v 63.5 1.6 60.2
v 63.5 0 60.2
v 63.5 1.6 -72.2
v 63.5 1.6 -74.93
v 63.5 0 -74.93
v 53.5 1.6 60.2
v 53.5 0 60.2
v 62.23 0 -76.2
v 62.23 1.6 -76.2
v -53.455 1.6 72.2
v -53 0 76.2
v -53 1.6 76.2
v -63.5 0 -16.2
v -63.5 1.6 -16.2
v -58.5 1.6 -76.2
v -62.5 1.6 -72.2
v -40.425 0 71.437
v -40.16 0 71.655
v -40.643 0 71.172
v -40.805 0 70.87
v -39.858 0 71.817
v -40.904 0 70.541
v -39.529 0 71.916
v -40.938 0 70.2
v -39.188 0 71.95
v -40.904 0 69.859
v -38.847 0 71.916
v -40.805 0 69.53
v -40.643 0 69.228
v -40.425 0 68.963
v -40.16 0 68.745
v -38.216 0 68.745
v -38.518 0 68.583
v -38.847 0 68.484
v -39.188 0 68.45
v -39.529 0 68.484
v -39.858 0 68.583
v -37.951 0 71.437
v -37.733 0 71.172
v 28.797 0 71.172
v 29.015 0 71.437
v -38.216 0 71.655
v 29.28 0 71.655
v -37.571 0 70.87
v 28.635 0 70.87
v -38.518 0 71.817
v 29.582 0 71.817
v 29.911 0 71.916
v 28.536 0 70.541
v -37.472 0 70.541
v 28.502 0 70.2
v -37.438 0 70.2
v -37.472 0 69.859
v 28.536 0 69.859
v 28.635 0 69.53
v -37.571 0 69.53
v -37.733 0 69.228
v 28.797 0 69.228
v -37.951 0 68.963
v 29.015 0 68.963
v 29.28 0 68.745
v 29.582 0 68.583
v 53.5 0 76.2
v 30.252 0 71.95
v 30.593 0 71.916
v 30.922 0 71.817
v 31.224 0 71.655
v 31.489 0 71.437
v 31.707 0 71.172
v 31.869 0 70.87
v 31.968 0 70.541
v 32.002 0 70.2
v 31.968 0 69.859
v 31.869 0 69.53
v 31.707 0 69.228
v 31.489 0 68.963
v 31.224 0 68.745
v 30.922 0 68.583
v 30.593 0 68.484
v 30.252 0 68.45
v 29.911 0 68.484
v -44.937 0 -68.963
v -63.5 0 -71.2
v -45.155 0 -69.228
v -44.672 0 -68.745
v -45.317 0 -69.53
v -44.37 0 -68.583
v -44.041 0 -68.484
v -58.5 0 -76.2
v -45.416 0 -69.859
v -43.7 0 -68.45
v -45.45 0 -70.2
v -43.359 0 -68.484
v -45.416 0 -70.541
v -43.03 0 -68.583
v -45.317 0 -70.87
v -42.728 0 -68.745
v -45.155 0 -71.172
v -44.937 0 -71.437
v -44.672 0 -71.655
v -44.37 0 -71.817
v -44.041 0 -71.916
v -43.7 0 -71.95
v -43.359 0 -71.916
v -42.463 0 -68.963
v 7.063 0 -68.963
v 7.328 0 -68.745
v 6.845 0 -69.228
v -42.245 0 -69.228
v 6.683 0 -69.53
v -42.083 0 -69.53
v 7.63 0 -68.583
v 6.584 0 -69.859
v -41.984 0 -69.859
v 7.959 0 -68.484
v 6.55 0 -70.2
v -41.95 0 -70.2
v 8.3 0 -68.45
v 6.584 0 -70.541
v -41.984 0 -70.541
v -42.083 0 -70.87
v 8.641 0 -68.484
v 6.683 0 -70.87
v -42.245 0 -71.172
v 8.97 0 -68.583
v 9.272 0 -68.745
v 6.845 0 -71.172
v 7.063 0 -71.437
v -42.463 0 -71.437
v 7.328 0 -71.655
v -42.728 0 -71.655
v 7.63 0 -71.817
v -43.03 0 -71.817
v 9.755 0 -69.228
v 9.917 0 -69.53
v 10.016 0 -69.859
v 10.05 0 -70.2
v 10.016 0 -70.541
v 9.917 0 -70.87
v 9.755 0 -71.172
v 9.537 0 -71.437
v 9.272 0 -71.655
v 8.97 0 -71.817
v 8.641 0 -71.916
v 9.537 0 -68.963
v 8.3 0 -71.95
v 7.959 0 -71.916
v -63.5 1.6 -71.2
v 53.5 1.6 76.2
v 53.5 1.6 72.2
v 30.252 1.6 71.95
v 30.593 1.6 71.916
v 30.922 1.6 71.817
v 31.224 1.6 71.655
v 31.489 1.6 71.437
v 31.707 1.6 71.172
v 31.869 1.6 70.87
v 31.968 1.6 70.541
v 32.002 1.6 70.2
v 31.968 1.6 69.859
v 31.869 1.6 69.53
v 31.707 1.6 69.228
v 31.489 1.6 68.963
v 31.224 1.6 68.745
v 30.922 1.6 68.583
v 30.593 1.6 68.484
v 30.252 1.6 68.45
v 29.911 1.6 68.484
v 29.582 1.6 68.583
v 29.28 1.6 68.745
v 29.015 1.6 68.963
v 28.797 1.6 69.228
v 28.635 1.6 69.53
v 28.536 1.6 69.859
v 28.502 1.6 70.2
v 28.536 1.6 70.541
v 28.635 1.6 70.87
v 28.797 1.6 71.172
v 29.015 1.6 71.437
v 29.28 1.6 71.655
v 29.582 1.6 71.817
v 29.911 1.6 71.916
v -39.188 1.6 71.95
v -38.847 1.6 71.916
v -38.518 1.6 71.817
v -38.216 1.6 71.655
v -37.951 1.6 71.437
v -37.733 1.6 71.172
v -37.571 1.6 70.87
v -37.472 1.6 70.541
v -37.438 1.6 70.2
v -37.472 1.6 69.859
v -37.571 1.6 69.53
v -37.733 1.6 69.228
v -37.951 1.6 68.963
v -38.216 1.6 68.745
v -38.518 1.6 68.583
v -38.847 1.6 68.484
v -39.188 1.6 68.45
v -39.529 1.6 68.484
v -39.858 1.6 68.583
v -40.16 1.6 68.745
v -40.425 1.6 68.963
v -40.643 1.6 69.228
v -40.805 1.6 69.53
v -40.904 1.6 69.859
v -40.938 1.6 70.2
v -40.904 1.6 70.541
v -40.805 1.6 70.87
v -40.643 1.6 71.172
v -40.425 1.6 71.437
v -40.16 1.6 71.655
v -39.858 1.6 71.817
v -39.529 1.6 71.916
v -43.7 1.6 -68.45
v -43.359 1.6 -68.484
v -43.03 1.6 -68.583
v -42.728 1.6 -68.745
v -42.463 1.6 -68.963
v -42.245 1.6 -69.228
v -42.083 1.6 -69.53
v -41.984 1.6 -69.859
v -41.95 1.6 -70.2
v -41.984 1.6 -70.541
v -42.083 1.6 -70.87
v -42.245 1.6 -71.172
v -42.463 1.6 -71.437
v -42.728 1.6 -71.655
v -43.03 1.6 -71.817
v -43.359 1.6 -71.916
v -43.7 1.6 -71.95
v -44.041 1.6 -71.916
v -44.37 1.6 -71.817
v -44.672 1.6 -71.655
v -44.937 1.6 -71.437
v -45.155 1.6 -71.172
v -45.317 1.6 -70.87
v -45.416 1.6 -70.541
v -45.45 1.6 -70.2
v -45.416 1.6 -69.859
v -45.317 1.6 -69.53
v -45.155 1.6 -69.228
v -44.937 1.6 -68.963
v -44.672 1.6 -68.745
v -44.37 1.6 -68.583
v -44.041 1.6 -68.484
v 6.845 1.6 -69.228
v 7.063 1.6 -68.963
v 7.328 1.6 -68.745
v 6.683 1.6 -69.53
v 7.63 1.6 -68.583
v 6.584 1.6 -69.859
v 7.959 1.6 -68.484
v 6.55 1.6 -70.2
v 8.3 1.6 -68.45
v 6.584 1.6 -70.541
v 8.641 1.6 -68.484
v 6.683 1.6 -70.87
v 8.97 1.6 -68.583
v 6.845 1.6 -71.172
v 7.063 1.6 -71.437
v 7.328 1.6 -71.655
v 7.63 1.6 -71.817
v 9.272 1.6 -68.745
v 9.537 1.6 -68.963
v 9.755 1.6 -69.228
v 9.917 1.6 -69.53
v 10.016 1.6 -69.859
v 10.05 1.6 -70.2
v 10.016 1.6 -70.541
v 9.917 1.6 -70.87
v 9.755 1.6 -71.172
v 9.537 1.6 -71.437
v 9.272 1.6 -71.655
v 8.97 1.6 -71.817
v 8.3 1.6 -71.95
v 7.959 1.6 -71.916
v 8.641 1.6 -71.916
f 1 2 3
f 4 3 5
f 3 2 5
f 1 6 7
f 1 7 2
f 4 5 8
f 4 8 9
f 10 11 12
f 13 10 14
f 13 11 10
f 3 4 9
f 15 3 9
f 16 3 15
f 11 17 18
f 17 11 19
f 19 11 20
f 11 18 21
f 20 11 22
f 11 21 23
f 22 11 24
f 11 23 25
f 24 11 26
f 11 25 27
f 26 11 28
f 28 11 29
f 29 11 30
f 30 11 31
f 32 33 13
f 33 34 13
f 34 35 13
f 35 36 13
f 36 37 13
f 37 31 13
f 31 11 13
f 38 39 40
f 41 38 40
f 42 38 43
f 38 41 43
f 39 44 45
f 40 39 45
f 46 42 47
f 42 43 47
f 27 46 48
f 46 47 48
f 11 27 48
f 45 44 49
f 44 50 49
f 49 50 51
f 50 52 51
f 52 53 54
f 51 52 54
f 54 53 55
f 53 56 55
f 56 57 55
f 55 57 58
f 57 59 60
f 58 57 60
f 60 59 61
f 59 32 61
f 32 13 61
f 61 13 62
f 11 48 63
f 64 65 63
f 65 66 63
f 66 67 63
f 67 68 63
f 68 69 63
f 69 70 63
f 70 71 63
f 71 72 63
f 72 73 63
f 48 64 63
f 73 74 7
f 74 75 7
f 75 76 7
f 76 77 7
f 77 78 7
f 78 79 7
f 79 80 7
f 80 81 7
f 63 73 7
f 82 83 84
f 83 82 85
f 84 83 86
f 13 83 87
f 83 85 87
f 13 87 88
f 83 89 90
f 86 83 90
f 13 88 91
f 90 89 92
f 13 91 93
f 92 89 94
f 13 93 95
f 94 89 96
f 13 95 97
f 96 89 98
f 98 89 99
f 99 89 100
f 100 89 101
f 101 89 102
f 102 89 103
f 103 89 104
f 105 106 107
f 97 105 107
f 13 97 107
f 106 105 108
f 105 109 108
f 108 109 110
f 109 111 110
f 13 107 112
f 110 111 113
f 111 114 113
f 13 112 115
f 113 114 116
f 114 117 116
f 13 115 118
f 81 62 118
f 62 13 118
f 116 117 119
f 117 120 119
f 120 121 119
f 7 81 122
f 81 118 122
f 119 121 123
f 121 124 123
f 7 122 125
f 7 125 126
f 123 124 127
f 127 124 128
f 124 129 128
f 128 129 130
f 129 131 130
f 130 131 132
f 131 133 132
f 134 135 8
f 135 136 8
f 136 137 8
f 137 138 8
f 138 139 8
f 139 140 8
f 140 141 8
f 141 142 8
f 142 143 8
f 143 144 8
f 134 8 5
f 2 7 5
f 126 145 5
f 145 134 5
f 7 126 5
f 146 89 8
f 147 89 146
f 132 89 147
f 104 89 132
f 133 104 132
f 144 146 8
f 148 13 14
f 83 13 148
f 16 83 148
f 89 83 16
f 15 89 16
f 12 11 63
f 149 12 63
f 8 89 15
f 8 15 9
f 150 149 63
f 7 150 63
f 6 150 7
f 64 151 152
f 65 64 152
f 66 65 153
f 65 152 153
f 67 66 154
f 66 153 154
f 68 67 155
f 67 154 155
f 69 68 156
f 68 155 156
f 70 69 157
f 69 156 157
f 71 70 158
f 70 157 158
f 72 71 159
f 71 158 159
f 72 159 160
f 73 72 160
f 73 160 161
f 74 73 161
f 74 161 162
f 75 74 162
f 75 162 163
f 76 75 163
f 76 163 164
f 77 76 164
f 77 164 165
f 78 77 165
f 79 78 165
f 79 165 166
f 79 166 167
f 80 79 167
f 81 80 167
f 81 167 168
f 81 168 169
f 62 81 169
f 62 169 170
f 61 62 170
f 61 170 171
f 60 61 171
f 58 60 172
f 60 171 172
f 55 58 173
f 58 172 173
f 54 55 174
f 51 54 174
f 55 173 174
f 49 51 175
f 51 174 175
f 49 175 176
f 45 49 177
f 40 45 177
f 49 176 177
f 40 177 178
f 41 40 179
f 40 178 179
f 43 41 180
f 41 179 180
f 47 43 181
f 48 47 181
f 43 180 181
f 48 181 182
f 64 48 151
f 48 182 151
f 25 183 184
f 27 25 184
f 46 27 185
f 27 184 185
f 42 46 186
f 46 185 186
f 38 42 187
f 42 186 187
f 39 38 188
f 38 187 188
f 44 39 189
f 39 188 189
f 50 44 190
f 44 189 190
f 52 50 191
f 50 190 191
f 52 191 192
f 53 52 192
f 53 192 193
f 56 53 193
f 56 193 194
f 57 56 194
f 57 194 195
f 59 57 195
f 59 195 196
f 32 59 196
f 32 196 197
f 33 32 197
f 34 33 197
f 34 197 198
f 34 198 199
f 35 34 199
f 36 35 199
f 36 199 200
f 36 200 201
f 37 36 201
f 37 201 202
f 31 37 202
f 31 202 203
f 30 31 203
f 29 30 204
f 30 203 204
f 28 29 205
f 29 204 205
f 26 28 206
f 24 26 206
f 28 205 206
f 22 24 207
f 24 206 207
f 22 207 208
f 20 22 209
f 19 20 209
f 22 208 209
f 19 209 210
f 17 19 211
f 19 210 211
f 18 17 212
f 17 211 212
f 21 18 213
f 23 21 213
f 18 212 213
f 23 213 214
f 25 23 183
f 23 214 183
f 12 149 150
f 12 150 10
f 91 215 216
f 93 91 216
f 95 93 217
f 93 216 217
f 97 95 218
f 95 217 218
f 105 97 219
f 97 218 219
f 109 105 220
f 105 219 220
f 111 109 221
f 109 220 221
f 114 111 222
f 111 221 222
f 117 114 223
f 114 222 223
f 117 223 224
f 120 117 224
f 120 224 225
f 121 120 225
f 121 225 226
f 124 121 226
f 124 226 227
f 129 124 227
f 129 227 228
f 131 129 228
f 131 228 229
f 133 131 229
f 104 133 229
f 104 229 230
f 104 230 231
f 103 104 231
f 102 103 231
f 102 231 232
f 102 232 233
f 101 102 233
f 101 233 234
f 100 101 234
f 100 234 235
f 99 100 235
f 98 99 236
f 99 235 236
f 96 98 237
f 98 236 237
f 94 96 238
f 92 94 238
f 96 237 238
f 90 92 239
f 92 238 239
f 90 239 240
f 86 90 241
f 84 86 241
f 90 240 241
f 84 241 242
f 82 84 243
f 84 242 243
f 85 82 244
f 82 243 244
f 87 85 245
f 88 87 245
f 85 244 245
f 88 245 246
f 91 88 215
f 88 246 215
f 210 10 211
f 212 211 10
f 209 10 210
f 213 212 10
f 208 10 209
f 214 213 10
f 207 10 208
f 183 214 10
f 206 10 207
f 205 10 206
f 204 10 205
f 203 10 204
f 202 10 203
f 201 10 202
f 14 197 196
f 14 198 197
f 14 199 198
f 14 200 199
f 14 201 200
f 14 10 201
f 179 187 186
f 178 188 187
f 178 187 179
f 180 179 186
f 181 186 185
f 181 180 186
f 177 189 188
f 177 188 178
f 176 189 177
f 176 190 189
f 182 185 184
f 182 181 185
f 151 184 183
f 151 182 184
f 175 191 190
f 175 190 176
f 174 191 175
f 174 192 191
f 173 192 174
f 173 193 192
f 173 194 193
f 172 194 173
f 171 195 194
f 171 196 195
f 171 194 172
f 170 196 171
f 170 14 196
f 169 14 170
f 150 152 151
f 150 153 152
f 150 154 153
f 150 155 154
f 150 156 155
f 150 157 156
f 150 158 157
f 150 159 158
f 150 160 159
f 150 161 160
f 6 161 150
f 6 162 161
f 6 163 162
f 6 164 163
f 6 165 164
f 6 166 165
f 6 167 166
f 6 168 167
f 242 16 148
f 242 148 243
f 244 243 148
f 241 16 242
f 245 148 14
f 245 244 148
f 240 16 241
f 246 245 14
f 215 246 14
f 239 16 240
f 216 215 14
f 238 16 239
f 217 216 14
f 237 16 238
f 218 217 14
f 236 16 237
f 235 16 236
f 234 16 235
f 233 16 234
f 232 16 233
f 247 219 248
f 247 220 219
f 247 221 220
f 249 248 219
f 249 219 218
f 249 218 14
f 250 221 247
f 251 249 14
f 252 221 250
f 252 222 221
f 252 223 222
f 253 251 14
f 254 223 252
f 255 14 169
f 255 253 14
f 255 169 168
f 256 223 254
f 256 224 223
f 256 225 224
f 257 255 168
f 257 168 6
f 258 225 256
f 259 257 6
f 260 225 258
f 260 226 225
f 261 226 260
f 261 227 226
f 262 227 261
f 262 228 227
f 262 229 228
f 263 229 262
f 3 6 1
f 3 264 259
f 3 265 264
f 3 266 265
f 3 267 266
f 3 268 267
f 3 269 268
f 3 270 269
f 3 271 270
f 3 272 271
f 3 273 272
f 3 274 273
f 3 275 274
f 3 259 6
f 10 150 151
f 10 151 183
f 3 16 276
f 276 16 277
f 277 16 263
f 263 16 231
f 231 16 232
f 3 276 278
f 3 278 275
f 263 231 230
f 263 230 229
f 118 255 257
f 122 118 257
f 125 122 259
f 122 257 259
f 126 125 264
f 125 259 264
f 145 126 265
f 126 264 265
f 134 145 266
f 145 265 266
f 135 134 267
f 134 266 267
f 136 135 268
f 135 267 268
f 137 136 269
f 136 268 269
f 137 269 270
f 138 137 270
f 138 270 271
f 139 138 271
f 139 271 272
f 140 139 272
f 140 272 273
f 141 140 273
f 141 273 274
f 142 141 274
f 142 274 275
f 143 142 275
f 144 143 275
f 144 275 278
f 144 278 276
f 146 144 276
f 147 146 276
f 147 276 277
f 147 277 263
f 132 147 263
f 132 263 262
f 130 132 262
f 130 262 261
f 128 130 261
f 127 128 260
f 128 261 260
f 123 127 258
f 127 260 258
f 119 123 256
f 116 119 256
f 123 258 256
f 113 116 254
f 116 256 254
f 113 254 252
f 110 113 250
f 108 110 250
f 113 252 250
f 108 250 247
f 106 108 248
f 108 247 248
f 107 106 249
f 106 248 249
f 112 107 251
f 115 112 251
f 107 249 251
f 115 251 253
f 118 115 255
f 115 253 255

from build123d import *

# Parameters (mm, degrees)
SKETCH1_W               = 127
SKETCH1_H               = 152.4
BOSS_EXTRUDE1_DEPTH     = 1.6
CHAMFER1_SIZE           = 5
CHAMFER2_SIZE           = 1.27
SKETCH4_OUTSIDE_W       = 168.678
SKETCH4_OUTSIDE_H       = 194.078
SKETCH4_OUTSIDE_W_2     = 146.645454771
SKETCH4_OUTSIDE_H_2     = 144.4
CUT_EXTRUDE3_DEPTH      = 0.0001
CUT_EXTRUDE4_DEPTH      = 100.203074549
CUT_EXTRUDE4_DEPTH_BACK = 100.203074549
SKETCH7_W               = 10
SKETCH7_H               = 16
CUT_EXTRUDE7_DEPTH      = 10
CUT_EXTRUDE8_REACH      = 101.203
SKETCH9_R               = 1.75


with BuildPart() as part:
    # Sketch1 → Boss-Extrude1 (new body)
    with BuildSketch(Plane(origin=(0, 0, 0), x_dir=(1, 0, 0), z_dir=(0, 1, 0))):
        Rectangle(SKETCH1_W, SKETCH1_H)
    extrude(amount=BOSS_EXTRUDE1_DEPTH)

    # Chamfer1
    chamfer1_edges = [part.edges().sort_by_distance(p)[0] for p in [
        (-63.5, 0.8, 76.2),
        (-63.5, 0.8, -76.2),
    ]]
    chamfer(chamfer1_edges, length=CHAMFER1_SIZE)

    # Chamfer2
    chamfer2_edges = [part.edges().sort_by_distance(p)[0] for p in [
        (63.5, 0.8, 76.2),
        (63.5, 0.8, -76.2),
    ]]
    chamfer(chamfer2_edges, length=CHAMFER2_SIZE)

    # Sketch4 outside → Cut-Extrude3 (cut)
    with BuildSketch(Plane(origin=(0, 1.6, 0), x_dir=(-1, 0, 0), z_dir=(0, 1, 0))):
        Rectangle(SKETCH4_OUTSIDE_W, SKETCH4_OUTSIDE_H)
        with Locations((0.842207065, 0)):
            Rectangle(SKETCH4_OUTSIDE_W_2, SKETCH4_OUTSIDE_H_2, mode=Mode.SUBTRACT)
    extrude(amount=-CUT_EXTRUDE3_DEPTH, mode=Mode.SUBTRACT)

    # Sketch5 → Cut-Extrude4 (cut, two sides: drawn at the far end of the back side and taken through both)
    with BuildSketch(Plane(origin=(0, 1.6, 0), x_dir=(1, 0, 0), z_dir=(0, 1, 0)).offset(-CUT_EXTRUDE4_DEPTH_BACK)):
        Polygon((-8.552407118, -467.338817365), (-53, -76.2), (-63.5, 16.2), (-107.947592882, 407.338817365), (-890.225227612, 318.4436316), (-790.830041847, -556.23400313), align=None)
    extrude(amount=CUT_EXTRUDE4_DEPTH + CUT_EXTRUDE4_DEPTH_BACK, mode=Mode.SUBTRACT)

    # Sketch7 → Cut-Extrude7 (cut)
    with BuildSketch(Plane(origin=(0, 1.6, 0), x_dir=(1, 0, 0), z_dir=(0, 1, 0))):
        with Locations((58.5, -68.2)):
            Rectangle(SKETCH7_W, SKETCH7_H)
    extrude(amount=-CUT_EXTRUDE7_DEPTH, mode=Mode.SUBTRACT)

    # Sketch9 → Cut-Extrude8 (cut, up to next)
    with BuildSketch(Plane(origin=(0, 1.6, 0), x_dir=(1, 0, 0), z_dir=(0, 1, 0)), mode=Mode.PRIVATE) as cut_extrude8_sk1:
        with Locations(Location((-43.7, 70.2, 0), (0, 0, 270))):
            Circle(SKETCH9_R)
    cut_extrude8_tool1 = extrude(cut_extrude8_sk1.sketch, amount=-CUT_EXTRUDE8_REACH, mode=Mode.PRIVATE) & part.part
    # Sketch9 → Cut-Extrude8 (cut, up to next)
    with BuildSketch(Plane(origin=(0, 1.6, 0), x_dir=(1, 0, 0), z_dir=(0, 1, 0)), mode=Mode.PRIVATE) as cut_extrude8_sk2:
        with Locations(Location((8.3, 70.2, 0), (0, 0, 270))):
            Circle(SKETCH9_R)
    cut_extrude8_tool2 = extrude(cut_extrude8_sk2.sketch, amount=-CUT_EXTRUDE8_REACH, mode=Mode.PRIVATE) & part.part
    # Sketch9 → Cut-Extrude8 (cut, up to next)
    with BuildSketch(Plane(origin=(0, 1.6, 0), x_dir=(1, 0, 0), z_dir=(0, 1, 0)), mode=Mode.PRIVATE) as cut_extrude8_sk3:
        with Locations(Location((30.252, -70.2, 0), (0, 0, 270))):
            Circle(SKETCH9_R)
    cut_extrude8_tool3 = extrude(cut_extrude8_sk3.sketch, amount=-CUT_EXTRUDE8_REACH, mode=Mode.PRIVATE) & part.part
    # Sketch9 → Cut-Extrude8 (cut, up to next)
    with BuildSketch(Plane(origin=(0, 1.6, 0), x_dir=(1, 0, 0), z_dir=(0, 1, 0)), mode=Mode.PRIVATE) as cut_extrude8_sk4:
        with Locations(Location((-39.188, -70.2, 0), (0, 0, 270))):
            Circle(SKETCH9_R)
    cut_extrude8_tool4 = extrude(cut_extrude8_sk4.sketch, amount=-CUT_EXTRUDE8_REACH, mode=Mode.PRIVATE) & part.part
    add(cut_extrude8_tool1.solids().sort_by_distance((-43.7, 1.6, -70.2))[0], mode=Mode.SUBTRACT)
    add(cut_extrude8_tool2.solids().sort_by_distance((8.3, 1.6, -70.2))[0], mode=Mode.SUBTRACT)
    add(cut_extrude8_tool3.solids().sort_by_distance((30.252, 1.6, 70.2))[0], mode=Mode.SUBTRACT)
    add(cut_extrude8_tool4.solids().sort_by_distance((-39.188, 1.6, 70.2))[0], mode=Mode.SUBTRACT)


solid = part.part
